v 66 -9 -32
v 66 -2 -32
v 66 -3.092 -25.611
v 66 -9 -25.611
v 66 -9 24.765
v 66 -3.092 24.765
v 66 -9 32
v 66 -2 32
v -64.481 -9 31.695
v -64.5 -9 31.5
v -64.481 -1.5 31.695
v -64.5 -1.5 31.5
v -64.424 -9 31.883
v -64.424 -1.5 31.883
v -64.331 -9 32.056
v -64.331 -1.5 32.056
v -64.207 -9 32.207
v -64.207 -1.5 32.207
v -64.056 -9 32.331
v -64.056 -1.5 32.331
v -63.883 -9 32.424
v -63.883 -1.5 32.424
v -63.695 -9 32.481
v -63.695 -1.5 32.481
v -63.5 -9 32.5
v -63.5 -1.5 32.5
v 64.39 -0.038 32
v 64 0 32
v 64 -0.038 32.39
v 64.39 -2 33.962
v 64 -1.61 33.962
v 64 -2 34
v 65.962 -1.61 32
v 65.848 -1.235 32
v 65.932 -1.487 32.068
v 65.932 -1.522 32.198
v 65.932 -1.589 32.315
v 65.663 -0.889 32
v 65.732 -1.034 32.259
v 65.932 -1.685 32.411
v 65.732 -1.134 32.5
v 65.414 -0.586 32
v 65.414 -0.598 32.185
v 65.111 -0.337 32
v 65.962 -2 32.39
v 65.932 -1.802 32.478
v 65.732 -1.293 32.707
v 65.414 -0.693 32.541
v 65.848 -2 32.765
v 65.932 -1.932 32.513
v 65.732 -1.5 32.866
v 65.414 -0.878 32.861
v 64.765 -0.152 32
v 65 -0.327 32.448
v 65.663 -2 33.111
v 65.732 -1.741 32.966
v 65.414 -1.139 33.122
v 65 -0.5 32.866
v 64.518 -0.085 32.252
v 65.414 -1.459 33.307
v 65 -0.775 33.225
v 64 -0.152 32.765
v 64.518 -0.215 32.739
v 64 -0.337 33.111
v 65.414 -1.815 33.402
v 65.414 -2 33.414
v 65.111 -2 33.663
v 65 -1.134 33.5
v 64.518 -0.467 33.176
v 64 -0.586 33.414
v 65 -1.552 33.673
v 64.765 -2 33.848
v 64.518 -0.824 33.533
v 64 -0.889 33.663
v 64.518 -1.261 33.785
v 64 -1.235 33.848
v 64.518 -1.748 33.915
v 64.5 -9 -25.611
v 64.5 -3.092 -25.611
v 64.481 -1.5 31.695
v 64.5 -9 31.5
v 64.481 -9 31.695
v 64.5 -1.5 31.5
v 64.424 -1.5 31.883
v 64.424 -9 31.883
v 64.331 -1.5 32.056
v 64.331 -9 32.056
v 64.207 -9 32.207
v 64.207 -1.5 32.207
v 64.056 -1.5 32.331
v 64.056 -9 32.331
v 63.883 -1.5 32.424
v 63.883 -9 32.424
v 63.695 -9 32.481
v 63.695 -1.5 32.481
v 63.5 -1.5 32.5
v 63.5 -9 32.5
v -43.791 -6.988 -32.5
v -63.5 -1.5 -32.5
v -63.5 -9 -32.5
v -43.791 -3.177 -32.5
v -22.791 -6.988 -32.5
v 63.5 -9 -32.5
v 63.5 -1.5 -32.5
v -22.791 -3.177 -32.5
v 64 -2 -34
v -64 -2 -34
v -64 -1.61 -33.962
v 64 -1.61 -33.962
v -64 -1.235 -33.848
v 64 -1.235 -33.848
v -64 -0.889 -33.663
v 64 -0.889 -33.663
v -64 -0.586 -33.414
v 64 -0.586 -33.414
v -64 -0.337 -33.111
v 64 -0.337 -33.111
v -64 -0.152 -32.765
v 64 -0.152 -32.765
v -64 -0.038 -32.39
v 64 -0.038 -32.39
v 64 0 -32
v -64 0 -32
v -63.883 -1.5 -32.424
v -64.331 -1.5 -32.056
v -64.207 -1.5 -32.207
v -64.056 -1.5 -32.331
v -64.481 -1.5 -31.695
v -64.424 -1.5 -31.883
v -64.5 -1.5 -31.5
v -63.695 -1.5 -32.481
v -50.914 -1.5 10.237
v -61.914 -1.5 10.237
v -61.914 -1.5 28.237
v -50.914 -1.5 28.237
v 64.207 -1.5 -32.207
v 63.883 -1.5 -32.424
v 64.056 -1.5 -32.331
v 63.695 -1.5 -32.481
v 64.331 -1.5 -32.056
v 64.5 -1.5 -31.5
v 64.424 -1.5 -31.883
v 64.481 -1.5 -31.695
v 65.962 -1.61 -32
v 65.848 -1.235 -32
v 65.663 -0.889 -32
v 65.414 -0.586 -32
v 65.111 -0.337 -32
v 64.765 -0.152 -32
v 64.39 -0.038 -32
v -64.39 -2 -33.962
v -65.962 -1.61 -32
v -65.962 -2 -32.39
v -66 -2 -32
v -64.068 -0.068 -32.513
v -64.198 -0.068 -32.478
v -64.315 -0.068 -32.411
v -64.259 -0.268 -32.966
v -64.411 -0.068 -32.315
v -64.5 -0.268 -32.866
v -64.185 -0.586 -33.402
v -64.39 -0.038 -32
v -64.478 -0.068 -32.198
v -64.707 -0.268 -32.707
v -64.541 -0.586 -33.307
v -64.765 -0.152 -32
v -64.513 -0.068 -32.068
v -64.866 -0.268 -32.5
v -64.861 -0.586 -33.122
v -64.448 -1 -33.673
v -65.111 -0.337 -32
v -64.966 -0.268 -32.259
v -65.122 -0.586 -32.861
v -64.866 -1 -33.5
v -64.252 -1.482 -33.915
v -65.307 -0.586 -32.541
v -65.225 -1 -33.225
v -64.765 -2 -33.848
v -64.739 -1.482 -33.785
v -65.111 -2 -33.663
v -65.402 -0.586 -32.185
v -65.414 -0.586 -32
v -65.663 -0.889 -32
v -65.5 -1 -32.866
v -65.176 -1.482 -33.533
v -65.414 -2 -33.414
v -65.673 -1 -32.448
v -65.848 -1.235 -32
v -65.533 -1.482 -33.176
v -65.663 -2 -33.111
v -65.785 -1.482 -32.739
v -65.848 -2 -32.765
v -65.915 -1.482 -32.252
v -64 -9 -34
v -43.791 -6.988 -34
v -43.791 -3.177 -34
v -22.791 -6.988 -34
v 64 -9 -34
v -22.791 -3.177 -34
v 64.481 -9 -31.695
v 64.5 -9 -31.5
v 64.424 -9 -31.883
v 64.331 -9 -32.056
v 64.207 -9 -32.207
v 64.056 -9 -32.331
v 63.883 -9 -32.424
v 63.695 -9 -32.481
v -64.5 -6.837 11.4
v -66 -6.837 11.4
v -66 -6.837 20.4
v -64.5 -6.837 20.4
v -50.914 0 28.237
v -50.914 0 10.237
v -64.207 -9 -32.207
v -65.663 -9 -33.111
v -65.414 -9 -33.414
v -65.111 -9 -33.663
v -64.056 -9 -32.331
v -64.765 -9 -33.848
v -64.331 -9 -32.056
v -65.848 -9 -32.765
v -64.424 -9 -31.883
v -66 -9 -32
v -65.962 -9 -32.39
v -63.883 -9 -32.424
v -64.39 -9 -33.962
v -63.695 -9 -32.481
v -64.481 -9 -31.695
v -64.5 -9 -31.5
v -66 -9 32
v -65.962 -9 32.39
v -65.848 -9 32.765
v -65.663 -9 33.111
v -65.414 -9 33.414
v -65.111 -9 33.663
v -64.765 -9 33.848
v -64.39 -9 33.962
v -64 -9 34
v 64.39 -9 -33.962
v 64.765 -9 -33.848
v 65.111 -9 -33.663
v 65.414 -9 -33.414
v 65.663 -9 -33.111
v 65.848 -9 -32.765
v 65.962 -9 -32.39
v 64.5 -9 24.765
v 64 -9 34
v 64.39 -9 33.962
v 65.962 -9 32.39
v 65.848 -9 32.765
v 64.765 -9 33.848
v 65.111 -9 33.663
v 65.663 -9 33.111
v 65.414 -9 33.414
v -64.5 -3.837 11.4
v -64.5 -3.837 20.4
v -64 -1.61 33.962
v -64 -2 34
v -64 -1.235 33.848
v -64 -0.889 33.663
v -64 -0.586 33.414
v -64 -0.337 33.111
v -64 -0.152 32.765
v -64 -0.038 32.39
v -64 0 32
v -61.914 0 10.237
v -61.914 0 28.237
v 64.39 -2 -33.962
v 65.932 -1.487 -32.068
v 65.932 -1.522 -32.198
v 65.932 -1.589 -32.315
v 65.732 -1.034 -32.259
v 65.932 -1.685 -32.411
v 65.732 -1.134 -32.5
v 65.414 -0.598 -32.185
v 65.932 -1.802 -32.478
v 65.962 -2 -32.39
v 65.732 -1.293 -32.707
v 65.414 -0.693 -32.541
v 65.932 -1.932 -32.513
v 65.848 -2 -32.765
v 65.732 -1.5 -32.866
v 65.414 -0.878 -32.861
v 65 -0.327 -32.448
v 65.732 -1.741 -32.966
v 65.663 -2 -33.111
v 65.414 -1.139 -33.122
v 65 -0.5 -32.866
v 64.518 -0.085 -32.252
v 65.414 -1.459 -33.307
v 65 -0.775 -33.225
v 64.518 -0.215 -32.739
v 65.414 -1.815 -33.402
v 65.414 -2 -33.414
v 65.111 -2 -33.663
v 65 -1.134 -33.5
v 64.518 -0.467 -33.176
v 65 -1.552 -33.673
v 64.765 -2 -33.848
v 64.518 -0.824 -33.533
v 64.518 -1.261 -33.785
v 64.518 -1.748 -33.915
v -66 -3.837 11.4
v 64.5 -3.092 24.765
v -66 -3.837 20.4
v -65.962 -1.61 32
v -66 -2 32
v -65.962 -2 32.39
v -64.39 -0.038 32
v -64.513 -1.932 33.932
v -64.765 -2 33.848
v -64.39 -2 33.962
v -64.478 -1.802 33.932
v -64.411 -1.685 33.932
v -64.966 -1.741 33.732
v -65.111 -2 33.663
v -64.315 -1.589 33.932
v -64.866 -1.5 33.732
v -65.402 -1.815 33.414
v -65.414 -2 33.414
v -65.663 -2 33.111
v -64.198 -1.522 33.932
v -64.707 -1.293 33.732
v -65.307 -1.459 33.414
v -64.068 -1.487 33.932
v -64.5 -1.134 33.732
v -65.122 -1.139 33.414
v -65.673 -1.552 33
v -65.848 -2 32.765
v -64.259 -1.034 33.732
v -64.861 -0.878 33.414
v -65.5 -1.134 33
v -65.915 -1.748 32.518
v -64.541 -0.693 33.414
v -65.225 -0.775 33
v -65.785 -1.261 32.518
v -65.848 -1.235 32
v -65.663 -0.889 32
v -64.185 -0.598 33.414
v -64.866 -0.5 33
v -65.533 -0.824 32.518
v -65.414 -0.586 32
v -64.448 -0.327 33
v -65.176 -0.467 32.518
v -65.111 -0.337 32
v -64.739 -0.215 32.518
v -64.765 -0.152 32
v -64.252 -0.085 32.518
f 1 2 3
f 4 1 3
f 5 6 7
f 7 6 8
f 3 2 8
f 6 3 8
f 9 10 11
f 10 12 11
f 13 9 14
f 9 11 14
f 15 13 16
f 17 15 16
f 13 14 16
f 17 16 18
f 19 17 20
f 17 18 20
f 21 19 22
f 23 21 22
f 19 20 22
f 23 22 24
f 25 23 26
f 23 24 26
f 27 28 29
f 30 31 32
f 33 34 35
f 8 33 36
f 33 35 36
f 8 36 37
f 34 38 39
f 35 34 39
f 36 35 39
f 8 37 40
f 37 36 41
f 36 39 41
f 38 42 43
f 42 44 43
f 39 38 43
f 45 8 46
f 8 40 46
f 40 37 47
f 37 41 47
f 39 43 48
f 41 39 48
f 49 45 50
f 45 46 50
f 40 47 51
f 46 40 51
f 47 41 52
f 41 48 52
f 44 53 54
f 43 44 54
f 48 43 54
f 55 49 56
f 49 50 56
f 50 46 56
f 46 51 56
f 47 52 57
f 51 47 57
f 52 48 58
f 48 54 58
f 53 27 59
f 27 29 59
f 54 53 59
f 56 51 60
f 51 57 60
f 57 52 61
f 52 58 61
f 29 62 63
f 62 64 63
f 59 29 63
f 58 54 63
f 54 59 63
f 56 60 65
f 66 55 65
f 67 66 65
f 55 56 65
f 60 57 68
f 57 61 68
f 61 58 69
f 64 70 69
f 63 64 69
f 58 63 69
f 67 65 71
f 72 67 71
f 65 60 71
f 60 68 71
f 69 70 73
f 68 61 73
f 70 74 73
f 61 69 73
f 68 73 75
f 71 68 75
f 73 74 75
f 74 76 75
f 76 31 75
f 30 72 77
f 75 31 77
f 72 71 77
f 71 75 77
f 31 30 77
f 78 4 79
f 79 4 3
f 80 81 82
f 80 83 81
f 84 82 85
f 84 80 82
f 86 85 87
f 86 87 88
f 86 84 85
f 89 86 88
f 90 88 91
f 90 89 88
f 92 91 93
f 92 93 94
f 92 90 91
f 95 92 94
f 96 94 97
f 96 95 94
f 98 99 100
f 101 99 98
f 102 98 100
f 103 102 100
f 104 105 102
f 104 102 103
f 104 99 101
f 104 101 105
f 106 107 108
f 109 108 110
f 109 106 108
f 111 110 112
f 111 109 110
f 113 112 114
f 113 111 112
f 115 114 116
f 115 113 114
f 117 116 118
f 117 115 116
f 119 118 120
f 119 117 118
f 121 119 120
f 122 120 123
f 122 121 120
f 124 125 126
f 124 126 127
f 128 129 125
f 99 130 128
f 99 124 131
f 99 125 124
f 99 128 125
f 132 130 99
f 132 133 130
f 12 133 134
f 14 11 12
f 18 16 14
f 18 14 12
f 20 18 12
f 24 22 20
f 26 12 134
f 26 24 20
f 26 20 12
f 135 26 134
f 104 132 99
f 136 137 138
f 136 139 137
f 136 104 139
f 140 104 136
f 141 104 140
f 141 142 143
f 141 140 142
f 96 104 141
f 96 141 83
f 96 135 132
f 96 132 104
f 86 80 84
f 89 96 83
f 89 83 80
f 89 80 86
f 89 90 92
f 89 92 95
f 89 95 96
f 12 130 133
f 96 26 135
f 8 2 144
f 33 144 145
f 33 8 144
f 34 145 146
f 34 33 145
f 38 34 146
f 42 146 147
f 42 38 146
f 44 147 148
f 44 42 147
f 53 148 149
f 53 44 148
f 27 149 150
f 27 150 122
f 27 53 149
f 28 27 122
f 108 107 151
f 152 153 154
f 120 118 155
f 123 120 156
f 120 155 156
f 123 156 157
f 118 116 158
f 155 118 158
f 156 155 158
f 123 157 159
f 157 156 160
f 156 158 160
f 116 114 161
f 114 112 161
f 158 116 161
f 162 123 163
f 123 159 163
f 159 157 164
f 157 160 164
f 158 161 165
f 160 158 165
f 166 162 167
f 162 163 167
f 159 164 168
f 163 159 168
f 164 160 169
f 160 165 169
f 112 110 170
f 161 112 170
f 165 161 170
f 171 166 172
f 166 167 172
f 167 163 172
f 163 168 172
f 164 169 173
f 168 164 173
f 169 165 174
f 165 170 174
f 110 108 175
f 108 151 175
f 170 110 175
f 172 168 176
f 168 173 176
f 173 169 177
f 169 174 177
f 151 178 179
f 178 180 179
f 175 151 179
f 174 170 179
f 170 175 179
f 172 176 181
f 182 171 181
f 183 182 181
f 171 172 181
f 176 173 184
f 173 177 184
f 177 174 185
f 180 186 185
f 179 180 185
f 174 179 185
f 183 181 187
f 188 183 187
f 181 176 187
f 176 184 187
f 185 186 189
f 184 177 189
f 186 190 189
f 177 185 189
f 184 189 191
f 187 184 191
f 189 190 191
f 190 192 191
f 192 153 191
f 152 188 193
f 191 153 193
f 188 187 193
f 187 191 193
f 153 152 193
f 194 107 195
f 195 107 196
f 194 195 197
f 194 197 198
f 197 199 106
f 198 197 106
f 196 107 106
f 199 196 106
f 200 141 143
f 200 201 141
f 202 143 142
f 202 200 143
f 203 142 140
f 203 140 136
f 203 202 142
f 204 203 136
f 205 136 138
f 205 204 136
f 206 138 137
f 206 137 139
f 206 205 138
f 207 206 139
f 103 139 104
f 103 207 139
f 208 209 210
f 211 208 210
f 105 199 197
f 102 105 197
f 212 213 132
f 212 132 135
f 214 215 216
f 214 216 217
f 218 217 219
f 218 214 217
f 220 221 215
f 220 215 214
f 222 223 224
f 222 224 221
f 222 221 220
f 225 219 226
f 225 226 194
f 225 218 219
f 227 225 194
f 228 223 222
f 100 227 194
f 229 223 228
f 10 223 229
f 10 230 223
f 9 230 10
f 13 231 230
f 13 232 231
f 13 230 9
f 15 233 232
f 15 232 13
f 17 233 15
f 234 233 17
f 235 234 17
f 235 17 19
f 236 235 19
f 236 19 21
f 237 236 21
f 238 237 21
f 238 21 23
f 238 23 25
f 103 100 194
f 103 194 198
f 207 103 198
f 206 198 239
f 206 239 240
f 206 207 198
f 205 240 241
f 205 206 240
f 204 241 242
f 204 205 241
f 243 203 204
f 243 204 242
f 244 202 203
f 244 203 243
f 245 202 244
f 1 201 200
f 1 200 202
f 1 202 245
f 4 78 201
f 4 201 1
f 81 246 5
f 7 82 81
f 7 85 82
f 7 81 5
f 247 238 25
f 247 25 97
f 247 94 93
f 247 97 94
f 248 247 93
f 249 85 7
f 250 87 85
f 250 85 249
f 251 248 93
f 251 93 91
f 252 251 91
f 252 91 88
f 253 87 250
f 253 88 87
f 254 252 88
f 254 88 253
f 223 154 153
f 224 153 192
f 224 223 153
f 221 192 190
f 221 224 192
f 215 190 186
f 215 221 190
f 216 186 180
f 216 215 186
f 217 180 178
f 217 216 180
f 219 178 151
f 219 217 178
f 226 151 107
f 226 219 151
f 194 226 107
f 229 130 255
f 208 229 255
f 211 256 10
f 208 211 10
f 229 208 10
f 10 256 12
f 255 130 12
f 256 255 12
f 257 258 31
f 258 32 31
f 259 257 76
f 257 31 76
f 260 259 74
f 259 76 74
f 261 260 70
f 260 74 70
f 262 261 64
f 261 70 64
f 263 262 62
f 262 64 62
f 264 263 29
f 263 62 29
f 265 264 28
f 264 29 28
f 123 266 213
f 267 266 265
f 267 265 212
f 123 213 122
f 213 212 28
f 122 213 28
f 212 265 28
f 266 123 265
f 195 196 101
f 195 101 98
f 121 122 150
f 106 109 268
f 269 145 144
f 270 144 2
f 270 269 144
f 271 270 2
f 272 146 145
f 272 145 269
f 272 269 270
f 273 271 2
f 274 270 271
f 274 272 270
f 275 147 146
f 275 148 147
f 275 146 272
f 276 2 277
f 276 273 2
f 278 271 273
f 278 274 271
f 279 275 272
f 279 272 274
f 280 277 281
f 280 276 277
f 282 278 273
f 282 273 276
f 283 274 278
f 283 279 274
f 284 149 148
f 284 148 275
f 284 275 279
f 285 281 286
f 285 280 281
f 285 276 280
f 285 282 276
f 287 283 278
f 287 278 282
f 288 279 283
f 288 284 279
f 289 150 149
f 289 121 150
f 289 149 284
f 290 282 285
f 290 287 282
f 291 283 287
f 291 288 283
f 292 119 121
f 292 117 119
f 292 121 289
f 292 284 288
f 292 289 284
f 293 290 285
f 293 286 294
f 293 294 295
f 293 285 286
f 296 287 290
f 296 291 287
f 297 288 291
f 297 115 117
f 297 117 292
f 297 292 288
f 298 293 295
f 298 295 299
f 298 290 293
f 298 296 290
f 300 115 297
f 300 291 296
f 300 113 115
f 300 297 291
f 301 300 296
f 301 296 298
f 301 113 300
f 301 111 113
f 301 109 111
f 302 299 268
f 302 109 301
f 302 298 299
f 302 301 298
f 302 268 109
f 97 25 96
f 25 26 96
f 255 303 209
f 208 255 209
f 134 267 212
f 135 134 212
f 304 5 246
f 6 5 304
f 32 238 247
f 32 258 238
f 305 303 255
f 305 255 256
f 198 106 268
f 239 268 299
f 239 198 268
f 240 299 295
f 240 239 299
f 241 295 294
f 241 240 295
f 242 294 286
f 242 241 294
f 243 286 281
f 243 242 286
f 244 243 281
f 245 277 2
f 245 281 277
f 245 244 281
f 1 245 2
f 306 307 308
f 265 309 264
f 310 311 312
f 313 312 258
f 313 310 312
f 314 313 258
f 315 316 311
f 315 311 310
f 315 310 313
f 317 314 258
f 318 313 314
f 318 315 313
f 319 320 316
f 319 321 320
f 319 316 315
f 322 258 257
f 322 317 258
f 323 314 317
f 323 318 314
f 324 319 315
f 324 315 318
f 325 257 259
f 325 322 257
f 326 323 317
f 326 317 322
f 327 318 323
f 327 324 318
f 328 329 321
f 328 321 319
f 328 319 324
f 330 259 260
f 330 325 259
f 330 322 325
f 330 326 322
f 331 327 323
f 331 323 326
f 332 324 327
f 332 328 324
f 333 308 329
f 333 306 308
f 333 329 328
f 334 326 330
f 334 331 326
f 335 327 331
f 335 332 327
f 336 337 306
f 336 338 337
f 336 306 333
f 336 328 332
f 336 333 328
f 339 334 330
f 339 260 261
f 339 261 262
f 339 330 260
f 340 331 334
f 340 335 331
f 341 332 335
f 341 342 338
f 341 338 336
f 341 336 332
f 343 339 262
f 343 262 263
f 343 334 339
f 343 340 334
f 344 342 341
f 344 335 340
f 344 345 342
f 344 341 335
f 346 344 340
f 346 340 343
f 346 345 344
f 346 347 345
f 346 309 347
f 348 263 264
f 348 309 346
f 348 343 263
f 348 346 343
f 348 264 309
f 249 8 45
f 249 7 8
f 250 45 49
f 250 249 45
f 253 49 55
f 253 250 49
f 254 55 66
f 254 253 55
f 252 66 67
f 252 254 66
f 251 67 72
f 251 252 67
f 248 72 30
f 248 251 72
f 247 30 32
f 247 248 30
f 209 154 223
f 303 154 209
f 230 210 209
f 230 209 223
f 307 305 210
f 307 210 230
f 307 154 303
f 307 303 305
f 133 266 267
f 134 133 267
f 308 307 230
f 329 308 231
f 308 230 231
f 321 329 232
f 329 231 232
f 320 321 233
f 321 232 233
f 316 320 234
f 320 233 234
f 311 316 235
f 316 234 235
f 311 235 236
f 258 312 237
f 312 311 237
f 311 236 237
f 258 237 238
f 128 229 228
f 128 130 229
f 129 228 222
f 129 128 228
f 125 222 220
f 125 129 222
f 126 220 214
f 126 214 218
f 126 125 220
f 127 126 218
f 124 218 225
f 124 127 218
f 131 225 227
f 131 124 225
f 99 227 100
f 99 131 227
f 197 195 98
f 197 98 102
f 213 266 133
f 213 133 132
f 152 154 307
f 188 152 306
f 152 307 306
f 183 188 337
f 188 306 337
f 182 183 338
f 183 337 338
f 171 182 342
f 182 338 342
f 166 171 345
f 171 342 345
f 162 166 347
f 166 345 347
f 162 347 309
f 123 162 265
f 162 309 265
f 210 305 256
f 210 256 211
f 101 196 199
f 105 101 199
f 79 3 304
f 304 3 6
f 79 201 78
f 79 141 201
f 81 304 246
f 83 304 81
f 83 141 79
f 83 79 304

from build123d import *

# Parameters (mm, degrees)
F0_W      = 132
F0_H      = 68
F1_DEPTH  = 9
F2_T      = -1.5
F3_R      = 2
F4_W      = 3
F4_H      = 9
F5_DEPTH  = 25
F6_W      = 21
F6_H      = 3.811
F7_DEPTH  = 25
F8_W      = 11
F8_H      = 18
F9_DEPTH  = 25
F10_W     = 4.2909509502
F10_H     = 50.3760259598
F11_DEPTH = 25
F10_W_2   = 1.6166590303
F12_DEPTH = 5
F13_R     = 1


with BuildPart() as f1:
    # F0 (on Front) → F1 (new body)
    with BuildSketch(Plane.XZ):
        Rectangle(F0_W, F0_H)
    extrude(amount=F1_DEPTH)

    # F2
    f2_openings = [f1.faces().sort_by_distance(p)[0] for p in [
        (0, -9, 0),
    ]]
    offset(amount=F2_T, openings=f2_openings)

    # F3
    f3_edges = [f1.edges().sort_by_distance(p)[0] for p in [
        (-66, -4.5, -34),
        (0, 0, -34),
        (-66, 0, 0),
        (-66, -4.5, 34),
        (0, 0, 34),
        (66, 0, 0),
        (66, -4.5, -34),
        (66, -4.5, 34),
    ]]
    fillet(f3_edges, radius=F3_R)

    # F4 (on face) → F5 (cut)
    with BuildSketch(Plane(origin=(-66, 0, 0), x_dir=(0, -1, 0), z_dir=(-1, 0, 0))):
        with Locations((5.3369137328, 15.8999992609)):
            Rectangle(F4_W, F4_H)
    extrude(amount=-F5_DEPTH, mode=Mode.SUBTRACT)

    # F6 (on face) → F7 (cut)
    with BuildSketch(Plane(origin=(0, 0, -34), x_dir=(1, 0, 0), z_dir=(0, 0, -1))):
        with Locations((-33.2909998, 5.0821127795)):
            Rectangle(F6_W, F6_H)
    extrude(amount=-F7_DEPTH, mode=Mode.SUBTRACT)

    # F8 (on face) → F9 (cut)
    with BuildSketch(Plane.XZ):
        with Locations((-56.4135685265, 19.2365734056)):
            Rectangle(F8_W, F8_H)
    extrude(amount=F9_DEPTH, mode=Mode.SUBTRACT)

    # F10 (on face) → F11 (cut)
    with BuildSketch(Plane.YZ.offset(66)):
        with Locations((-5.2378654946, -0.4230095074)):
            Rectangle(F10_W, F10_H)
    extrude(amount=-F11_DEPTH, mode=Mode.SUBTRACT)

    # F10 (on face) → F12 (cut)
    with BuildSketch(Plane.YZ.offset(66)):
        with Locations((-8.1916704848, -0.4230095074)):
            Rectangle(F10_W_2, F10_H)
    extrude(amount=-F12_DEPTH, mode=Mode.SUBTRACT)

    # F13
    f13_edges = [f1.edges().sort_by_distance(p)[0] for p in [
        (-64.5, -5.25, 32.5),
        (-64.5, -5.25, -32.5),
        (64.5, -5.25, 32.5),
        (64.5, -5.25, -32.5),
    ]]
    fillet(f13_edges, radius=F13_R)


solid = f1.part
